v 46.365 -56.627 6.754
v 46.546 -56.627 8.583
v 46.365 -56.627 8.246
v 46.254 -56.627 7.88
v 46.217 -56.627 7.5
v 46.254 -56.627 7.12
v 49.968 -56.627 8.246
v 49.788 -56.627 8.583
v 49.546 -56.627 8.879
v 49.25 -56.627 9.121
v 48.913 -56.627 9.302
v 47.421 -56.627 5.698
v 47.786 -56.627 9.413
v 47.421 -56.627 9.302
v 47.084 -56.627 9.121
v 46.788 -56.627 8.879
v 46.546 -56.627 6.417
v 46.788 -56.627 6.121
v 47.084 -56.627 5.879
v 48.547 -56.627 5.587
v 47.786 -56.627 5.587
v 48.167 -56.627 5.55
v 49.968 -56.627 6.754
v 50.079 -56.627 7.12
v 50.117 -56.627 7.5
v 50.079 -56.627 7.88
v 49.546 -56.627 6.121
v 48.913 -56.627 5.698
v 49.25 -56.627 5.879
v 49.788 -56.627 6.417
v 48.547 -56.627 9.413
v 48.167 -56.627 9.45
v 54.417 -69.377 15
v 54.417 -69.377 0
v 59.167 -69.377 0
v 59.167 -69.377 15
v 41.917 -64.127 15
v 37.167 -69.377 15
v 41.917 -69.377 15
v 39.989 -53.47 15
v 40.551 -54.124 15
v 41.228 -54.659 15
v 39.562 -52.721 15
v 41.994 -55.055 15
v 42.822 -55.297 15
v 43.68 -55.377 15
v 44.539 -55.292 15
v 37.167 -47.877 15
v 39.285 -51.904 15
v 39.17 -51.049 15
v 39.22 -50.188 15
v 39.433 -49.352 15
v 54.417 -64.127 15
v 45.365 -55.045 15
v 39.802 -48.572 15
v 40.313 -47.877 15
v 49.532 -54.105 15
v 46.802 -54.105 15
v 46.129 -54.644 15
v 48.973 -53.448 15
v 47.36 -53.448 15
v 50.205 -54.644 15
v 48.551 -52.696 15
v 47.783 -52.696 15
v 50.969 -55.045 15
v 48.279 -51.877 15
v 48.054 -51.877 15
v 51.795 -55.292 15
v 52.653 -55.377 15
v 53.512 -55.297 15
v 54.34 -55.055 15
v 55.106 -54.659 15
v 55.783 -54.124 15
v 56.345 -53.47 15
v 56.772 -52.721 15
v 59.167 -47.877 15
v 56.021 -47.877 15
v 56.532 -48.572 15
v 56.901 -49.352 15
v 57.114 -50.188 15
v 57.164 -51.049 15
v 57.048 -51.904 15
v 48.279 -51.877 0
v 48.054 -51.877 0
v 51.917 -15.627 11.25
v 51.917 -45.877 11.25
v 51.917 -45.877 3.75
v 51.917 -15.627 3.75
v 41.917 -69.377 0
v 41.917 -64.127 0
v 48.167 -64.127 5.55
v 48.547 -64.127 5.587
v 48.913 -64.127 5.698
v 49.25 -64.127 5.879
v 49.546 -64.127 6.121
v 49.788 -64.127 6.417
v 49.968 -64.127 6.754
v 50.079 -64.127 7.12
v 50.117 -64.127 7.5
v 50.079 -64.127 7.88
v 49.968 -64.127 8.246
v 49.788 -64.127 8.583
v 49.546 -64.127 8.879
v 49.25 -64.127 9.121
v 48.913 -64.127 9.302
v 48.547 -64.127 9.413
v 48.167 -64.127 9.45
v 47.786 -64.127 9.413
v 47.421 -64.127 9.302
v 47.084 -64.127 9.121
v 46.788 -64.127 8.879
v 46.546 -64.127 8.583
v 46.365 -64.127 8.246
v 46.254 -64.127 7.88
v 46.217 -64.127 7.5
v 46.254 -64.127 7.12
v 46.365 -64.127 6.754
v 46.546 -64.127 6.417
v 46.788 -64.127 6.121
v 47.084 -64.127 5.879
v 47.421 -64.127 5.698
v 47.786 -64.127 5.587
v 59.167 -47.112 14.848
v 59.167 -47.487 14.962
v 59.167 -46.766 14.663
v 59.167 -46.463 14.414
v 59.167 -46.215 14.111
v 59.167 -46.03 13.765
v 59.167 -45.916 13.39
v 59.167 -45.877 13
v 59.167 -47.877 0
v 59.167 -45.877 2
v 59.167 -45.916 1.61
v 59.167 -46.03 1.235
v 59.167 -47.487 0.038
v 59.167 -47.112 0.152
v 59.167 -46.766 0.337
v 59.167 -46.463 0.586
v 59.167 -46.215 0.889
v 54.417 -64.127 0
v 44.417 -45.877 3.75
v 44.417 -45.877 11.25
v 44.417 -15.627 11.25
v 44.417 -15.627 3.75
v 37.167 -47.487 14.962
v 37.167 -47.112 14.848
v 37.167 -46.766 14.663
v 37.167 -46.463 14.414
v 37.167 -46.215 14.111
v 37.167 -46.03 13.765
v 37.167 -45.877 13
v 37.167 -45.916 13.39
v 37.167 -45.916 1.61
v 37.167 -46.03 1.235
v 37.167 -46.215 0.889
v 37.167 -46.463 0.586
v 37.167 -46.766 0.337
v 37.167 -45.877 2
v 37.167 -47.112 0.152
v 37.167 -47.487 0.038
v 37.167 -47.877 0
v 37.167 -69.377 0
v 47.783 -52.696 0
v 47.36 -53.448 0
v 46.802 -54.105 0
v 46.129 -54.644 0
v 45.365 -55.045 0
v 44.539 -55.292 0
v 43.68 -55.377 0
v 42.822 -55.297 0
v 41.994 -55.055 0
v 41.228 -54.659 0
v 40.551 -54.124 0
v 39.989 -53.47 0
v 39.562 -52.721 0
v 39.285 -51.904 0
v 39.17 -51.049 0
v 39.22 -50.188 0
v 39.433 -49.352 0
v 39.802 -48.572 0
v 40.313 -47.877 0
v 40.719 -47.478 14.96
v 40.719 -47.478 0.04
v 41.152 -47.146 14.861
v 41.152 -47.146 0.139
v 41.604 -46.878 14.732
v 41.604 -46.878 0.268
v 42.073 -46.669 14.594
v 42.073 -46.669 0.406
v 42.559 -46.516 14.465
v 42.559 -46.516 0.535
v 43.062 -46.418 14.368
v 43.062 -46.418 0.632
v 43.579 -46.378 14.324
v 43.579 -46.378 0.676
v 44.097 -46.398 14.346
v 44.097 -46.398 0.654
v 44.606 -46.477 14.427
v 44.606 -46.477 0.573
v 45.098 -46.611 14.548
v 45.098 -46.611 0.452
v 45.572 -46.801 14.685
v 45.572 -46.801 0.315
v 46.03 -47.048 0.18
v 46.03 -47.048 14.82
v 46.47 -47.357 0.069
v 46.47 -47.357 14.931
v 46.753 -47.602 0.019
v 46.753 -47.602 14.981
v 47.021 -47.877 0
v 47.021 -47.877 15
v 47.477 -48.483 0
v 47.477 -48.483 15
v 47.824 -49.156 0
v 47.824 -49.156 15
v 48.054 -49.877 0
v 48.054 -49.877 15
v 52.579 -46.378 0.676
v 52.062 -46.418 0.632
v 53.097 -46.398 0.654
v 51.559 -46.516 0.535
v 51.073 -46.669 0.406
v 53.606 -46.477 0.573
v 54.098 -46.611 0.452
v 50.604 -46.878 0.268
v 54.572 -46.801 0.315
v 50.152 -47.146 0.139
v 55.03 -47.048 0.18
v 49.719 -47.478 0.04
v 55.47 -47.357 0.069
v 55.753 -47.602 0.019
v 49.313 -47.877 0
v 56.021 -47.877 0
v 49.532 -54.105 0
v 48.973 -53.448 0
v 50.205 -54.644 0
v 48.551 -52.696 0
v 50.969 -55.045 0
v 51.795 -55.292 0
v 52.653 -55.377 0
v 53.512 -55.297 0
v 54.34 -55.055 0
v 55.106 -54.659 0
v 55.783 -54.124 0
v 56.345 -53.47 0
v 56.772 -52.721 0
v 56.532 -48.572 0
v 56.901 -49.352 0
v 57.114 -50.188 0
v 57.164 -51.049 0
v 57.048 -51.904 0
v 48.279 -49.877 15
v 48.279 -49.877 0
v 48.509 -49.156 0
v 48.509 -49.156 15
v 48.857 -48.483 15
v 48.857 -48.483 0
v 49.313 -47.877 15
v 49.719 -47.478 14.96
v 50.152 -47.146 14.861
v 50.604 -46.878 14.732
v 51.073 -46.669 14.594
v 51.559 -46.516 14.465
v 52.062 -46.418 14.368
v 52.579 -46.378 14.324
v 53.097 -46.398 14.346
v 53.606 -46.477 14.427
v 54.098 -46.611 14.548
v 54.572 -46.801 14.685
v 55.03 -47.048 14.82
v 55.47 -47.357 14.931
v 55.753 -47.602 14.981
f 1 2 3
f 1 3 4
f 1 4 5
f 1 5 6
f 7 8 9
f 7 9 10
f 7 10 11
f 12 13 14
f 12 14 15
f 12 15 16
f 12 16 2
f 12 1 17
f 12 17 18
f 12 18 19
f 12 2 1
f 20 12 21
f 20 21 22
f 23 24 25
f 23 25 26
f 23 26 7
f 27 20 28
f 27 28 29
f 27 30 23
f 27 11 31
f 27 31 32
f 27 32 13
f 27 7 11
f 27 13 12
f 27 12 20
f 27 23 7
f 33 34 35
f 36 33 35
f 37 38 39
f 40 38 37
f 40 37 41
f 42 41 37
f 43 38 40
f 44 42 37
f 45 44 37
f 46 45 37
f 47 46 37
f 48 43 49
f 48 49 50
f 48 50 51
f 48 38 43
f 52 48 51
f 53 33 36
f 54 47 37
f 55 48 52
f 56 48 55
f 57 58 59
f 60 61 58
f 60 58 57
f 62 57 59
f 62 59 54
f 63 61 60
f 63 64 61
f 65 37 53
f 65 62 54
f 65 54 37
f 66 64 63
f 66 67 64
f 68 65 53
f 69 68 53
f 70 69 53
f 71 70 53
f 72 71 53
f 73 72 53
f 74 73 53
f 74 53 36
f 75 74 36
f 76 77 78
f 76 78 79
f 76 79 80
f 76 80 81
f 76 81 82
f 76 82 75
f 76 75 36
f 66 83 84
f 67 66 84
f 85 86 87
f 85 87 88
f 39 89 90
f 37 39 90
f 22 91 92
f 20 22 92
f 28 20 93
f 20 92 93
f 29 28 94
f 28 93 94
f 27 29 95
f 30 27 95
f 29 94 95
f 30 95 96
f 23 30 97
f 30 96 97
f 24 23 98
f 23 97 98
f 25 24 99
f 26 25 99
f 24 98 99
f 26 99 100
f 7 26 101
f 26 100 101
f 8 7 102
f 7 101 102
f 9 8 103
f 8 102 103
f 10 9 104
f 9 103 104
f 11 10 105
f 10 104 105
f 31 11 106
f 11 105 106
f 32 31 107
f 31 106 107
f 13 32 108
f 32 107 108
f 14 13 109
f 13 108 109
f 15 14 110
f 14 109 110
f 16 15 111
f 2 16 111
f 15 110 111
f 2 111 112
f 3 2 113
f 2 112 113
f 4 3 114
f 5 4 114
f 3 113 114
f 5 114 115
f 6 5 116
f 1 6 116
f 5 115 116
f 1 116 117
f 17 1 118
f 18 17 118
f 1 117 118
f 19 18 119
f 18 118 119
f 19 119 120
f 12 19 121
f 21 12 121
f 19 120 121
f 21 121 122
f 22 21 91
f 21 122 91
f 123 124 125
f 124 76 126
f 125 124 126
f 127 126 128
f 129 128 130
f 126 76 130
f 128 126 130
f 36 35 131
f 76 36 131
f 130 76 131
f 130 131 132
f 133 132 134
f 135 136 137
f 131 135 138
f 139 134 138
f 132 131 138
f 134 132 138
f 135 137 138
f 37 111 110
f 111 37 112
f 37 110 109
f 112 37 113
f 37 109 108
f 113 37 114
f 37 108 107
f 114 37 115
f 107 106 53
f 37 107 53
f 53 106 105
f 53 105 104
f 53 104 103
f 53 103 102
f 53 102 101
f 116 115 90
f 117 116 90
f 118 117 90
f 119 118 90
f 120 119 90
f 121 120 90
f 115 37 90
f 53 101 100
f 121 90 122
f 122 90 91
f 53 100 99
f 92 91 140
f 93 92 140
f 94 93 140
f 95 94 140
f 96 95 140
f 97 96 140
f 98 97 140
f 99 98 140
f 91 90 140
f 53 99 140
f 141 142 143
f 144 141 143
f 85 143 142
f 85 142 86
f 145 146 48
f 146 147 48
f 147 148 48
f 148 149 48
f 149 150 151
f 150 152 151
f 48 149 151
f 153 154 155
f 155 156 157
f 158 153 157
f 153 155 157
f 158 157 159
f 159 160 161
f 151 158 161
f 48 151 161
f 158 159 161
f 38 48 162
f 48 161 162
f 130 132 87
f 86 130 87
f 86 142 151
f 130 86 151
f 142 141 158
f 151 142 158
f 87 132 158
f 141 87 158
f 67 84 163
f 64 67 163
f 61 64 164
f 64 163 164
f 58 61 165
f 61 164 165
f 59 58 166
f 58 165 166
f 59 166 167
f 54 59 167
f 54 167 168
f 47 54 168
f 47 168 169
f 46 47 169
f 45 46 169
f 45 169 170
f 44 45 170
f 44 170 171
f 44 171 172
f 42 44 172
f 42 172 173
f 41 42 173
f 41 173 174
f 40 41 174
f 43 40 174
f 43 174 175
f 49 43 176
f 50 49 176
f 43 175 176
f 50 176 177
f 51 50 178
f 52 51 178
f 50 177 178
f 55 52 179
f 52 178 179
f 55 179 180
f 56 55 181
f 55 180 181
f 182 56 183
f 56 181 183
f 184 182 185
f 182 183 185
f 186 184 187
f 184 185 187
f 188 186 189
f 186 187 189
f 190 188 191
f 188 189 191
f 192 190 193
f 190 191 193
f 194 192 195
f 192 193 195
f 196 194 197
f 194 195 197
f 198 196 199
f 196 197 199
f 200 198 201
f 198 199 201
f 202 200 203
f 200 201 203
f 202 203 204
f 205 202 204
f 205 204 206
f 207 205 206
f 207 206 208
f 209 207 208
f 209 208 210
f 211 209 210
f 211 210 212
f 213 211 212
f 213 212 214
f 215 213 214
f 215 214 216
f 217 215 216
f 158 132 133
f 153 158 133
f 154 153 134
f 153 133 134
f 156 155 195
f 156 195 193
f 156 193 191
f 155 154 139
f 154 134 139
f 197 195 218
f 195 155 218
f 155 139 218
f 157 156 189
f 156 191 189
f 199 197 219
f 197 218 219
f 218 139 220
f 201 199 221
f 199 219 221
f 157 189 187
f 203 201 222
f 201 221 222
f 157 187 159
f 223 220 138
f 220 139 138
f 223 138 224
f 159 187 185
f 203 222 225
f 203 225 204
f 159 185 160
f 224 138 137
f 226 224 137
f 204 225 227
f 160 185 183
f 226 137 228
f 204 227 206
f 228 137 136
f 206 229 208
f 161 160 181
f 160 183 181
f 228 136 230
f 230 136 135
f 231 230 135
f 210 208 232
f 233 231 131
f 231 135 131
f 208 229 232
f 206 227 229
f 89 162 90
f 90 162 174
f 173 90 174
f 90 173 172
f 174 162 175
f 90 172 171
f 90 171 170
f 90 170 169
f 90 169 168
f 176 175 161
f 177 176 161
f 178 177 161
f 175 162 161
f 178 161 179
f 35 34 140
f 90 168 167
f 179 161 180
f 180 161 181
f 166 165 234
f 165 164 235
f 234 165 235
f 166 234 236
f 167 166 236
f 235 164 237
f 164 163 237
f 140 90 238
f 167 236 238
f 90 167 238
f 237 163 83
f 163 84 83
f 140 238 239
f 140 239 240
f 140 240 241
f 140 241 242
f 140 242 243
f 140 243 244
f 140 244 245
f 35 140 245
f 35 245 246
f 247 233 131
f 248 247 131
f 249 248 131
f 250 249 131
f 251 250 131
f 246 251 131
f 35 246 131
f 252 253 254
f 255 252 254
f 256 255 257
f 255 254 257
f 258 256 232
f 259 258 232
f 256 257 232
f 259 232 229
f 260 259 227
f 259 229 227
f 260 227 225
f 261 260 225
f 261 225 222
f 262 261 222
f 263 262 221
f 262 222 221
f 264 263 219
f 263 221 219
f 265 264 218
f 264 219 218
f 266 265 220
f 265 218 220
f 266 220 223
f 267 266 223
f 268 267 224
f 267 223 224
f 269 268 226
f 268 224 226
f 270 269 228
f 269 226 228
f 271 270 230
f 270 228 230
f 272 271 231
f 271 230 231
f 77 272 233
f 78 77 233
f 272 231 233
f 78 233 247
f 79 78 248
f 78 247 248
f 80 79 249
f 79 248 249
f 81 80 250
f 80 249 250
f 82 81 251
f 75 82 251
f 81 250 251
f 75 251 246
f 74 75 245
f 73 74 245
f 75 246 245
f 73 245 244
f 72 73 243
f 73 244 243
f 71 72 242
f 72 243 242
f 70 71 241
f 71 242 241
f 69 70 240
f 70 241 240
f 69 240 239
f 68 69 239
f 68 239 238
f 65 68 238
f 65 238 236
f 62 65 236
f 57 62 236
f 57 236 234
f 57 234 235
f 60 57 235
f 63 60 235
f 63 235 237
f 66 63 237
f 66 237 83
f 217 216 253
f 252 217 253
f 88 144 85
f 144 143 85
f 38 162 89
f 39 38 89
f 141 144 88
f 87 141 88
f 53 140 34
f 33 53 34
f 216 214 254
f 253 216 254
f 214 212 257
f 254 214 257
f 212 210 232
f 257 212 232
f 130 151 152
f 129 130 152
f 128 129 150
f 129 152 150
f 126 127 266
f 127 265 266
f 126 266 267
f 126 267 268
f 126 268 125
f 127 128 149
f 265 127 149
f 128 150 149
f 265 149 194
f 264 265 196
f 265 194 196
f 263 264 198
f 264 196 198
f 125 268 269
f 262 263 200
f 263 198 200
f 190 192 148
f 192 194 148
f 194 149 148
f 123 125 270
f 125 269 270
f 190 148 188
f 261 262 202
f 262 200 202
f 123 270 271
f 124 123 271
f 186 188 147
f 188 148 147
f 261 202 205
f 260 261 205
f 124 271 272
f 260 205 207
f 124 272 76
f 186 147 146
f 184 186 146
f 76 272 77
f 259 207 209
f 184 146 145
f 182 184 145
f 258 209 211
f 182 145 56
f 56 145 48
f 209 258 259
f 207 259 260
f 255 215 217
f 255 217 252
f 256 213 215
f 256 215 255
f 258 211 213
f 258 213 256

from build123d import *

# Parameters (mm, degrees)
PUSHER_BASE_DEPTH = 15
SKETCH3_R         = 1.95
SCREW_HOLE_DEPTH  = 7.5
SKETCH6_W         = 7.5
SKETCH6_H         = 30.25
PUSHER_HEAD_DEPTH = 3.75
FILLET1_R         = 2


with BuildPart() as part:
    # Sketch1 → pusher base (new body)
    with BuildSketch(Plane.XY):
        Polygon((59.166899441, -45.877477752), (51.666899441, -45.877477752), (44.666899441, -45.877477752), (37.166899441, -45.877477752), (37.166899441, -69.377477752), (41.916899441, -69.377477752), (41.916899441, -64.127477752), (54.416899441, -64.127477752), (54.416899441, -69.377477752), (59.166899441, -69.377477752), align=None)
        with BuildLine():
            Line((48.279417247, -51.877477752), (48.054381634, -51.877477752))
            ThreePointArc((48.054381634, -51.877477752), (39.166899441, -50.877477752), (48.054381634, -49.877477752))
            Line((48.054381634, -49.877477752), (48.279417247, -49.877477752))
            ThreePointArc((48.279417247, -49.877477752), (57.166899441, -50.877477752), (48.279417247, -51.877477752))
        make_face(mode=Mode.SUBTRACT)
    extrude(amount=PUSHER_BASE_DEPTH)

    # Sketch3 → screw hole (cut)
    with BuildSketch(Plane.XZ.offset(64.127477752)):
        with Locations(Location((48.166899441, 7.5, 0), (0, 0, 270))):
            Circle(SKETCH3_R)
    extrude(amount=-SCREW_HOLE_DEPTH, mode=Mode.SUBTRACT)

    # Sketch6 → pusher head (add, symmetric)
    with BuildSketch(Plane.XY.offset(7.5)):
        with Locations((48.166899441, -30.752477752)):
            Rectangle(SKETCH6_W, SKETCH6_H)
    extrude(amount=PUSHER_HEAD_DEPTH, both=True)

    # Fillet1
    # the kernel refuses this fillet: 2 mm, written as the material it takes off along each edge
    with BuildSketch(Plane(origin=(64.166899441, -45.877477752, 0), x_dir=(0, -1, 0), z_dir=(-1, 0, 0)), Plane(origin=(32.166899441, -45.877477752, 15), x_dir=(0, -1, 0), z_dir=(1, 0, 0))) as fillet1_piece_1:
        with BuildLine():
            CenterArc((FILLET1_R, FILLET1_R), FILLET1_R, 180, 90)
            Line((0, FILLET1_R), (0, 0))
            Line((0, 0), (FILLET1_R, 0))
        make_face()
    extrude(amount=32, mode=Mode.SUBTRACT)


solid = part.part
